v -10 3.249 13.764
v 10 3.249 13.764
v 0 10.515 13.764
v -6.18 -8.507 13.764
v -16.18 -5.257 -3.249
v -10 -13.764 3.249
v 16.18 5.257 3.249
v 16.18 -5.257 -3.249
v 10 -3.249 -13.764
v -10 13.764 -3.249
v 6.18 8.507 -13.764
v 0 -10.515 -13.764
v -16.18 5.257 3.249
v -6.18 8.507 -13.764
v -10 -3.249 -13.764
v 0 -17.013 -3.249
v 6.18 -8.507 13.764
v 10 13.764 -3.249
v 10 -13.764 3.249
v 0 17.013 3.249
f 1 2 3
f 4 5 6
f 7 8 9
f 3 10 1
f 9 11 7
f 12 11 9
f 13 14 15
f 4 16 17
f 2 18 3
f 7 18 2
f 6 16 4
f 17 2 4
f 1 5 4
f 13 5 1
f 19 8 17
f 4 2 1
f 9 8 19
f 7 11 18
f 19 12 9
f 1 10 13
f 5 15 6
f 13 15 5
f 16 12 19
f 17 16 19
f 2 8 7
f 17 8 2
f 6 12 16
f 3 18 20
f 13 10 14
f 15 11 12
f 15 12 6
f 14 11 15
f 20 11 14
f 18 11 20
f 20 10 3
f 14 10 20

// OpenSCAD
module dodecahedron(r){hull()for(a=[0:72:288])rotate([atan(sqrt(5)/2-0.5),0,a])translate([-r/2,-r/2,-r/2])cube(r);}

dodecahedron(20);
